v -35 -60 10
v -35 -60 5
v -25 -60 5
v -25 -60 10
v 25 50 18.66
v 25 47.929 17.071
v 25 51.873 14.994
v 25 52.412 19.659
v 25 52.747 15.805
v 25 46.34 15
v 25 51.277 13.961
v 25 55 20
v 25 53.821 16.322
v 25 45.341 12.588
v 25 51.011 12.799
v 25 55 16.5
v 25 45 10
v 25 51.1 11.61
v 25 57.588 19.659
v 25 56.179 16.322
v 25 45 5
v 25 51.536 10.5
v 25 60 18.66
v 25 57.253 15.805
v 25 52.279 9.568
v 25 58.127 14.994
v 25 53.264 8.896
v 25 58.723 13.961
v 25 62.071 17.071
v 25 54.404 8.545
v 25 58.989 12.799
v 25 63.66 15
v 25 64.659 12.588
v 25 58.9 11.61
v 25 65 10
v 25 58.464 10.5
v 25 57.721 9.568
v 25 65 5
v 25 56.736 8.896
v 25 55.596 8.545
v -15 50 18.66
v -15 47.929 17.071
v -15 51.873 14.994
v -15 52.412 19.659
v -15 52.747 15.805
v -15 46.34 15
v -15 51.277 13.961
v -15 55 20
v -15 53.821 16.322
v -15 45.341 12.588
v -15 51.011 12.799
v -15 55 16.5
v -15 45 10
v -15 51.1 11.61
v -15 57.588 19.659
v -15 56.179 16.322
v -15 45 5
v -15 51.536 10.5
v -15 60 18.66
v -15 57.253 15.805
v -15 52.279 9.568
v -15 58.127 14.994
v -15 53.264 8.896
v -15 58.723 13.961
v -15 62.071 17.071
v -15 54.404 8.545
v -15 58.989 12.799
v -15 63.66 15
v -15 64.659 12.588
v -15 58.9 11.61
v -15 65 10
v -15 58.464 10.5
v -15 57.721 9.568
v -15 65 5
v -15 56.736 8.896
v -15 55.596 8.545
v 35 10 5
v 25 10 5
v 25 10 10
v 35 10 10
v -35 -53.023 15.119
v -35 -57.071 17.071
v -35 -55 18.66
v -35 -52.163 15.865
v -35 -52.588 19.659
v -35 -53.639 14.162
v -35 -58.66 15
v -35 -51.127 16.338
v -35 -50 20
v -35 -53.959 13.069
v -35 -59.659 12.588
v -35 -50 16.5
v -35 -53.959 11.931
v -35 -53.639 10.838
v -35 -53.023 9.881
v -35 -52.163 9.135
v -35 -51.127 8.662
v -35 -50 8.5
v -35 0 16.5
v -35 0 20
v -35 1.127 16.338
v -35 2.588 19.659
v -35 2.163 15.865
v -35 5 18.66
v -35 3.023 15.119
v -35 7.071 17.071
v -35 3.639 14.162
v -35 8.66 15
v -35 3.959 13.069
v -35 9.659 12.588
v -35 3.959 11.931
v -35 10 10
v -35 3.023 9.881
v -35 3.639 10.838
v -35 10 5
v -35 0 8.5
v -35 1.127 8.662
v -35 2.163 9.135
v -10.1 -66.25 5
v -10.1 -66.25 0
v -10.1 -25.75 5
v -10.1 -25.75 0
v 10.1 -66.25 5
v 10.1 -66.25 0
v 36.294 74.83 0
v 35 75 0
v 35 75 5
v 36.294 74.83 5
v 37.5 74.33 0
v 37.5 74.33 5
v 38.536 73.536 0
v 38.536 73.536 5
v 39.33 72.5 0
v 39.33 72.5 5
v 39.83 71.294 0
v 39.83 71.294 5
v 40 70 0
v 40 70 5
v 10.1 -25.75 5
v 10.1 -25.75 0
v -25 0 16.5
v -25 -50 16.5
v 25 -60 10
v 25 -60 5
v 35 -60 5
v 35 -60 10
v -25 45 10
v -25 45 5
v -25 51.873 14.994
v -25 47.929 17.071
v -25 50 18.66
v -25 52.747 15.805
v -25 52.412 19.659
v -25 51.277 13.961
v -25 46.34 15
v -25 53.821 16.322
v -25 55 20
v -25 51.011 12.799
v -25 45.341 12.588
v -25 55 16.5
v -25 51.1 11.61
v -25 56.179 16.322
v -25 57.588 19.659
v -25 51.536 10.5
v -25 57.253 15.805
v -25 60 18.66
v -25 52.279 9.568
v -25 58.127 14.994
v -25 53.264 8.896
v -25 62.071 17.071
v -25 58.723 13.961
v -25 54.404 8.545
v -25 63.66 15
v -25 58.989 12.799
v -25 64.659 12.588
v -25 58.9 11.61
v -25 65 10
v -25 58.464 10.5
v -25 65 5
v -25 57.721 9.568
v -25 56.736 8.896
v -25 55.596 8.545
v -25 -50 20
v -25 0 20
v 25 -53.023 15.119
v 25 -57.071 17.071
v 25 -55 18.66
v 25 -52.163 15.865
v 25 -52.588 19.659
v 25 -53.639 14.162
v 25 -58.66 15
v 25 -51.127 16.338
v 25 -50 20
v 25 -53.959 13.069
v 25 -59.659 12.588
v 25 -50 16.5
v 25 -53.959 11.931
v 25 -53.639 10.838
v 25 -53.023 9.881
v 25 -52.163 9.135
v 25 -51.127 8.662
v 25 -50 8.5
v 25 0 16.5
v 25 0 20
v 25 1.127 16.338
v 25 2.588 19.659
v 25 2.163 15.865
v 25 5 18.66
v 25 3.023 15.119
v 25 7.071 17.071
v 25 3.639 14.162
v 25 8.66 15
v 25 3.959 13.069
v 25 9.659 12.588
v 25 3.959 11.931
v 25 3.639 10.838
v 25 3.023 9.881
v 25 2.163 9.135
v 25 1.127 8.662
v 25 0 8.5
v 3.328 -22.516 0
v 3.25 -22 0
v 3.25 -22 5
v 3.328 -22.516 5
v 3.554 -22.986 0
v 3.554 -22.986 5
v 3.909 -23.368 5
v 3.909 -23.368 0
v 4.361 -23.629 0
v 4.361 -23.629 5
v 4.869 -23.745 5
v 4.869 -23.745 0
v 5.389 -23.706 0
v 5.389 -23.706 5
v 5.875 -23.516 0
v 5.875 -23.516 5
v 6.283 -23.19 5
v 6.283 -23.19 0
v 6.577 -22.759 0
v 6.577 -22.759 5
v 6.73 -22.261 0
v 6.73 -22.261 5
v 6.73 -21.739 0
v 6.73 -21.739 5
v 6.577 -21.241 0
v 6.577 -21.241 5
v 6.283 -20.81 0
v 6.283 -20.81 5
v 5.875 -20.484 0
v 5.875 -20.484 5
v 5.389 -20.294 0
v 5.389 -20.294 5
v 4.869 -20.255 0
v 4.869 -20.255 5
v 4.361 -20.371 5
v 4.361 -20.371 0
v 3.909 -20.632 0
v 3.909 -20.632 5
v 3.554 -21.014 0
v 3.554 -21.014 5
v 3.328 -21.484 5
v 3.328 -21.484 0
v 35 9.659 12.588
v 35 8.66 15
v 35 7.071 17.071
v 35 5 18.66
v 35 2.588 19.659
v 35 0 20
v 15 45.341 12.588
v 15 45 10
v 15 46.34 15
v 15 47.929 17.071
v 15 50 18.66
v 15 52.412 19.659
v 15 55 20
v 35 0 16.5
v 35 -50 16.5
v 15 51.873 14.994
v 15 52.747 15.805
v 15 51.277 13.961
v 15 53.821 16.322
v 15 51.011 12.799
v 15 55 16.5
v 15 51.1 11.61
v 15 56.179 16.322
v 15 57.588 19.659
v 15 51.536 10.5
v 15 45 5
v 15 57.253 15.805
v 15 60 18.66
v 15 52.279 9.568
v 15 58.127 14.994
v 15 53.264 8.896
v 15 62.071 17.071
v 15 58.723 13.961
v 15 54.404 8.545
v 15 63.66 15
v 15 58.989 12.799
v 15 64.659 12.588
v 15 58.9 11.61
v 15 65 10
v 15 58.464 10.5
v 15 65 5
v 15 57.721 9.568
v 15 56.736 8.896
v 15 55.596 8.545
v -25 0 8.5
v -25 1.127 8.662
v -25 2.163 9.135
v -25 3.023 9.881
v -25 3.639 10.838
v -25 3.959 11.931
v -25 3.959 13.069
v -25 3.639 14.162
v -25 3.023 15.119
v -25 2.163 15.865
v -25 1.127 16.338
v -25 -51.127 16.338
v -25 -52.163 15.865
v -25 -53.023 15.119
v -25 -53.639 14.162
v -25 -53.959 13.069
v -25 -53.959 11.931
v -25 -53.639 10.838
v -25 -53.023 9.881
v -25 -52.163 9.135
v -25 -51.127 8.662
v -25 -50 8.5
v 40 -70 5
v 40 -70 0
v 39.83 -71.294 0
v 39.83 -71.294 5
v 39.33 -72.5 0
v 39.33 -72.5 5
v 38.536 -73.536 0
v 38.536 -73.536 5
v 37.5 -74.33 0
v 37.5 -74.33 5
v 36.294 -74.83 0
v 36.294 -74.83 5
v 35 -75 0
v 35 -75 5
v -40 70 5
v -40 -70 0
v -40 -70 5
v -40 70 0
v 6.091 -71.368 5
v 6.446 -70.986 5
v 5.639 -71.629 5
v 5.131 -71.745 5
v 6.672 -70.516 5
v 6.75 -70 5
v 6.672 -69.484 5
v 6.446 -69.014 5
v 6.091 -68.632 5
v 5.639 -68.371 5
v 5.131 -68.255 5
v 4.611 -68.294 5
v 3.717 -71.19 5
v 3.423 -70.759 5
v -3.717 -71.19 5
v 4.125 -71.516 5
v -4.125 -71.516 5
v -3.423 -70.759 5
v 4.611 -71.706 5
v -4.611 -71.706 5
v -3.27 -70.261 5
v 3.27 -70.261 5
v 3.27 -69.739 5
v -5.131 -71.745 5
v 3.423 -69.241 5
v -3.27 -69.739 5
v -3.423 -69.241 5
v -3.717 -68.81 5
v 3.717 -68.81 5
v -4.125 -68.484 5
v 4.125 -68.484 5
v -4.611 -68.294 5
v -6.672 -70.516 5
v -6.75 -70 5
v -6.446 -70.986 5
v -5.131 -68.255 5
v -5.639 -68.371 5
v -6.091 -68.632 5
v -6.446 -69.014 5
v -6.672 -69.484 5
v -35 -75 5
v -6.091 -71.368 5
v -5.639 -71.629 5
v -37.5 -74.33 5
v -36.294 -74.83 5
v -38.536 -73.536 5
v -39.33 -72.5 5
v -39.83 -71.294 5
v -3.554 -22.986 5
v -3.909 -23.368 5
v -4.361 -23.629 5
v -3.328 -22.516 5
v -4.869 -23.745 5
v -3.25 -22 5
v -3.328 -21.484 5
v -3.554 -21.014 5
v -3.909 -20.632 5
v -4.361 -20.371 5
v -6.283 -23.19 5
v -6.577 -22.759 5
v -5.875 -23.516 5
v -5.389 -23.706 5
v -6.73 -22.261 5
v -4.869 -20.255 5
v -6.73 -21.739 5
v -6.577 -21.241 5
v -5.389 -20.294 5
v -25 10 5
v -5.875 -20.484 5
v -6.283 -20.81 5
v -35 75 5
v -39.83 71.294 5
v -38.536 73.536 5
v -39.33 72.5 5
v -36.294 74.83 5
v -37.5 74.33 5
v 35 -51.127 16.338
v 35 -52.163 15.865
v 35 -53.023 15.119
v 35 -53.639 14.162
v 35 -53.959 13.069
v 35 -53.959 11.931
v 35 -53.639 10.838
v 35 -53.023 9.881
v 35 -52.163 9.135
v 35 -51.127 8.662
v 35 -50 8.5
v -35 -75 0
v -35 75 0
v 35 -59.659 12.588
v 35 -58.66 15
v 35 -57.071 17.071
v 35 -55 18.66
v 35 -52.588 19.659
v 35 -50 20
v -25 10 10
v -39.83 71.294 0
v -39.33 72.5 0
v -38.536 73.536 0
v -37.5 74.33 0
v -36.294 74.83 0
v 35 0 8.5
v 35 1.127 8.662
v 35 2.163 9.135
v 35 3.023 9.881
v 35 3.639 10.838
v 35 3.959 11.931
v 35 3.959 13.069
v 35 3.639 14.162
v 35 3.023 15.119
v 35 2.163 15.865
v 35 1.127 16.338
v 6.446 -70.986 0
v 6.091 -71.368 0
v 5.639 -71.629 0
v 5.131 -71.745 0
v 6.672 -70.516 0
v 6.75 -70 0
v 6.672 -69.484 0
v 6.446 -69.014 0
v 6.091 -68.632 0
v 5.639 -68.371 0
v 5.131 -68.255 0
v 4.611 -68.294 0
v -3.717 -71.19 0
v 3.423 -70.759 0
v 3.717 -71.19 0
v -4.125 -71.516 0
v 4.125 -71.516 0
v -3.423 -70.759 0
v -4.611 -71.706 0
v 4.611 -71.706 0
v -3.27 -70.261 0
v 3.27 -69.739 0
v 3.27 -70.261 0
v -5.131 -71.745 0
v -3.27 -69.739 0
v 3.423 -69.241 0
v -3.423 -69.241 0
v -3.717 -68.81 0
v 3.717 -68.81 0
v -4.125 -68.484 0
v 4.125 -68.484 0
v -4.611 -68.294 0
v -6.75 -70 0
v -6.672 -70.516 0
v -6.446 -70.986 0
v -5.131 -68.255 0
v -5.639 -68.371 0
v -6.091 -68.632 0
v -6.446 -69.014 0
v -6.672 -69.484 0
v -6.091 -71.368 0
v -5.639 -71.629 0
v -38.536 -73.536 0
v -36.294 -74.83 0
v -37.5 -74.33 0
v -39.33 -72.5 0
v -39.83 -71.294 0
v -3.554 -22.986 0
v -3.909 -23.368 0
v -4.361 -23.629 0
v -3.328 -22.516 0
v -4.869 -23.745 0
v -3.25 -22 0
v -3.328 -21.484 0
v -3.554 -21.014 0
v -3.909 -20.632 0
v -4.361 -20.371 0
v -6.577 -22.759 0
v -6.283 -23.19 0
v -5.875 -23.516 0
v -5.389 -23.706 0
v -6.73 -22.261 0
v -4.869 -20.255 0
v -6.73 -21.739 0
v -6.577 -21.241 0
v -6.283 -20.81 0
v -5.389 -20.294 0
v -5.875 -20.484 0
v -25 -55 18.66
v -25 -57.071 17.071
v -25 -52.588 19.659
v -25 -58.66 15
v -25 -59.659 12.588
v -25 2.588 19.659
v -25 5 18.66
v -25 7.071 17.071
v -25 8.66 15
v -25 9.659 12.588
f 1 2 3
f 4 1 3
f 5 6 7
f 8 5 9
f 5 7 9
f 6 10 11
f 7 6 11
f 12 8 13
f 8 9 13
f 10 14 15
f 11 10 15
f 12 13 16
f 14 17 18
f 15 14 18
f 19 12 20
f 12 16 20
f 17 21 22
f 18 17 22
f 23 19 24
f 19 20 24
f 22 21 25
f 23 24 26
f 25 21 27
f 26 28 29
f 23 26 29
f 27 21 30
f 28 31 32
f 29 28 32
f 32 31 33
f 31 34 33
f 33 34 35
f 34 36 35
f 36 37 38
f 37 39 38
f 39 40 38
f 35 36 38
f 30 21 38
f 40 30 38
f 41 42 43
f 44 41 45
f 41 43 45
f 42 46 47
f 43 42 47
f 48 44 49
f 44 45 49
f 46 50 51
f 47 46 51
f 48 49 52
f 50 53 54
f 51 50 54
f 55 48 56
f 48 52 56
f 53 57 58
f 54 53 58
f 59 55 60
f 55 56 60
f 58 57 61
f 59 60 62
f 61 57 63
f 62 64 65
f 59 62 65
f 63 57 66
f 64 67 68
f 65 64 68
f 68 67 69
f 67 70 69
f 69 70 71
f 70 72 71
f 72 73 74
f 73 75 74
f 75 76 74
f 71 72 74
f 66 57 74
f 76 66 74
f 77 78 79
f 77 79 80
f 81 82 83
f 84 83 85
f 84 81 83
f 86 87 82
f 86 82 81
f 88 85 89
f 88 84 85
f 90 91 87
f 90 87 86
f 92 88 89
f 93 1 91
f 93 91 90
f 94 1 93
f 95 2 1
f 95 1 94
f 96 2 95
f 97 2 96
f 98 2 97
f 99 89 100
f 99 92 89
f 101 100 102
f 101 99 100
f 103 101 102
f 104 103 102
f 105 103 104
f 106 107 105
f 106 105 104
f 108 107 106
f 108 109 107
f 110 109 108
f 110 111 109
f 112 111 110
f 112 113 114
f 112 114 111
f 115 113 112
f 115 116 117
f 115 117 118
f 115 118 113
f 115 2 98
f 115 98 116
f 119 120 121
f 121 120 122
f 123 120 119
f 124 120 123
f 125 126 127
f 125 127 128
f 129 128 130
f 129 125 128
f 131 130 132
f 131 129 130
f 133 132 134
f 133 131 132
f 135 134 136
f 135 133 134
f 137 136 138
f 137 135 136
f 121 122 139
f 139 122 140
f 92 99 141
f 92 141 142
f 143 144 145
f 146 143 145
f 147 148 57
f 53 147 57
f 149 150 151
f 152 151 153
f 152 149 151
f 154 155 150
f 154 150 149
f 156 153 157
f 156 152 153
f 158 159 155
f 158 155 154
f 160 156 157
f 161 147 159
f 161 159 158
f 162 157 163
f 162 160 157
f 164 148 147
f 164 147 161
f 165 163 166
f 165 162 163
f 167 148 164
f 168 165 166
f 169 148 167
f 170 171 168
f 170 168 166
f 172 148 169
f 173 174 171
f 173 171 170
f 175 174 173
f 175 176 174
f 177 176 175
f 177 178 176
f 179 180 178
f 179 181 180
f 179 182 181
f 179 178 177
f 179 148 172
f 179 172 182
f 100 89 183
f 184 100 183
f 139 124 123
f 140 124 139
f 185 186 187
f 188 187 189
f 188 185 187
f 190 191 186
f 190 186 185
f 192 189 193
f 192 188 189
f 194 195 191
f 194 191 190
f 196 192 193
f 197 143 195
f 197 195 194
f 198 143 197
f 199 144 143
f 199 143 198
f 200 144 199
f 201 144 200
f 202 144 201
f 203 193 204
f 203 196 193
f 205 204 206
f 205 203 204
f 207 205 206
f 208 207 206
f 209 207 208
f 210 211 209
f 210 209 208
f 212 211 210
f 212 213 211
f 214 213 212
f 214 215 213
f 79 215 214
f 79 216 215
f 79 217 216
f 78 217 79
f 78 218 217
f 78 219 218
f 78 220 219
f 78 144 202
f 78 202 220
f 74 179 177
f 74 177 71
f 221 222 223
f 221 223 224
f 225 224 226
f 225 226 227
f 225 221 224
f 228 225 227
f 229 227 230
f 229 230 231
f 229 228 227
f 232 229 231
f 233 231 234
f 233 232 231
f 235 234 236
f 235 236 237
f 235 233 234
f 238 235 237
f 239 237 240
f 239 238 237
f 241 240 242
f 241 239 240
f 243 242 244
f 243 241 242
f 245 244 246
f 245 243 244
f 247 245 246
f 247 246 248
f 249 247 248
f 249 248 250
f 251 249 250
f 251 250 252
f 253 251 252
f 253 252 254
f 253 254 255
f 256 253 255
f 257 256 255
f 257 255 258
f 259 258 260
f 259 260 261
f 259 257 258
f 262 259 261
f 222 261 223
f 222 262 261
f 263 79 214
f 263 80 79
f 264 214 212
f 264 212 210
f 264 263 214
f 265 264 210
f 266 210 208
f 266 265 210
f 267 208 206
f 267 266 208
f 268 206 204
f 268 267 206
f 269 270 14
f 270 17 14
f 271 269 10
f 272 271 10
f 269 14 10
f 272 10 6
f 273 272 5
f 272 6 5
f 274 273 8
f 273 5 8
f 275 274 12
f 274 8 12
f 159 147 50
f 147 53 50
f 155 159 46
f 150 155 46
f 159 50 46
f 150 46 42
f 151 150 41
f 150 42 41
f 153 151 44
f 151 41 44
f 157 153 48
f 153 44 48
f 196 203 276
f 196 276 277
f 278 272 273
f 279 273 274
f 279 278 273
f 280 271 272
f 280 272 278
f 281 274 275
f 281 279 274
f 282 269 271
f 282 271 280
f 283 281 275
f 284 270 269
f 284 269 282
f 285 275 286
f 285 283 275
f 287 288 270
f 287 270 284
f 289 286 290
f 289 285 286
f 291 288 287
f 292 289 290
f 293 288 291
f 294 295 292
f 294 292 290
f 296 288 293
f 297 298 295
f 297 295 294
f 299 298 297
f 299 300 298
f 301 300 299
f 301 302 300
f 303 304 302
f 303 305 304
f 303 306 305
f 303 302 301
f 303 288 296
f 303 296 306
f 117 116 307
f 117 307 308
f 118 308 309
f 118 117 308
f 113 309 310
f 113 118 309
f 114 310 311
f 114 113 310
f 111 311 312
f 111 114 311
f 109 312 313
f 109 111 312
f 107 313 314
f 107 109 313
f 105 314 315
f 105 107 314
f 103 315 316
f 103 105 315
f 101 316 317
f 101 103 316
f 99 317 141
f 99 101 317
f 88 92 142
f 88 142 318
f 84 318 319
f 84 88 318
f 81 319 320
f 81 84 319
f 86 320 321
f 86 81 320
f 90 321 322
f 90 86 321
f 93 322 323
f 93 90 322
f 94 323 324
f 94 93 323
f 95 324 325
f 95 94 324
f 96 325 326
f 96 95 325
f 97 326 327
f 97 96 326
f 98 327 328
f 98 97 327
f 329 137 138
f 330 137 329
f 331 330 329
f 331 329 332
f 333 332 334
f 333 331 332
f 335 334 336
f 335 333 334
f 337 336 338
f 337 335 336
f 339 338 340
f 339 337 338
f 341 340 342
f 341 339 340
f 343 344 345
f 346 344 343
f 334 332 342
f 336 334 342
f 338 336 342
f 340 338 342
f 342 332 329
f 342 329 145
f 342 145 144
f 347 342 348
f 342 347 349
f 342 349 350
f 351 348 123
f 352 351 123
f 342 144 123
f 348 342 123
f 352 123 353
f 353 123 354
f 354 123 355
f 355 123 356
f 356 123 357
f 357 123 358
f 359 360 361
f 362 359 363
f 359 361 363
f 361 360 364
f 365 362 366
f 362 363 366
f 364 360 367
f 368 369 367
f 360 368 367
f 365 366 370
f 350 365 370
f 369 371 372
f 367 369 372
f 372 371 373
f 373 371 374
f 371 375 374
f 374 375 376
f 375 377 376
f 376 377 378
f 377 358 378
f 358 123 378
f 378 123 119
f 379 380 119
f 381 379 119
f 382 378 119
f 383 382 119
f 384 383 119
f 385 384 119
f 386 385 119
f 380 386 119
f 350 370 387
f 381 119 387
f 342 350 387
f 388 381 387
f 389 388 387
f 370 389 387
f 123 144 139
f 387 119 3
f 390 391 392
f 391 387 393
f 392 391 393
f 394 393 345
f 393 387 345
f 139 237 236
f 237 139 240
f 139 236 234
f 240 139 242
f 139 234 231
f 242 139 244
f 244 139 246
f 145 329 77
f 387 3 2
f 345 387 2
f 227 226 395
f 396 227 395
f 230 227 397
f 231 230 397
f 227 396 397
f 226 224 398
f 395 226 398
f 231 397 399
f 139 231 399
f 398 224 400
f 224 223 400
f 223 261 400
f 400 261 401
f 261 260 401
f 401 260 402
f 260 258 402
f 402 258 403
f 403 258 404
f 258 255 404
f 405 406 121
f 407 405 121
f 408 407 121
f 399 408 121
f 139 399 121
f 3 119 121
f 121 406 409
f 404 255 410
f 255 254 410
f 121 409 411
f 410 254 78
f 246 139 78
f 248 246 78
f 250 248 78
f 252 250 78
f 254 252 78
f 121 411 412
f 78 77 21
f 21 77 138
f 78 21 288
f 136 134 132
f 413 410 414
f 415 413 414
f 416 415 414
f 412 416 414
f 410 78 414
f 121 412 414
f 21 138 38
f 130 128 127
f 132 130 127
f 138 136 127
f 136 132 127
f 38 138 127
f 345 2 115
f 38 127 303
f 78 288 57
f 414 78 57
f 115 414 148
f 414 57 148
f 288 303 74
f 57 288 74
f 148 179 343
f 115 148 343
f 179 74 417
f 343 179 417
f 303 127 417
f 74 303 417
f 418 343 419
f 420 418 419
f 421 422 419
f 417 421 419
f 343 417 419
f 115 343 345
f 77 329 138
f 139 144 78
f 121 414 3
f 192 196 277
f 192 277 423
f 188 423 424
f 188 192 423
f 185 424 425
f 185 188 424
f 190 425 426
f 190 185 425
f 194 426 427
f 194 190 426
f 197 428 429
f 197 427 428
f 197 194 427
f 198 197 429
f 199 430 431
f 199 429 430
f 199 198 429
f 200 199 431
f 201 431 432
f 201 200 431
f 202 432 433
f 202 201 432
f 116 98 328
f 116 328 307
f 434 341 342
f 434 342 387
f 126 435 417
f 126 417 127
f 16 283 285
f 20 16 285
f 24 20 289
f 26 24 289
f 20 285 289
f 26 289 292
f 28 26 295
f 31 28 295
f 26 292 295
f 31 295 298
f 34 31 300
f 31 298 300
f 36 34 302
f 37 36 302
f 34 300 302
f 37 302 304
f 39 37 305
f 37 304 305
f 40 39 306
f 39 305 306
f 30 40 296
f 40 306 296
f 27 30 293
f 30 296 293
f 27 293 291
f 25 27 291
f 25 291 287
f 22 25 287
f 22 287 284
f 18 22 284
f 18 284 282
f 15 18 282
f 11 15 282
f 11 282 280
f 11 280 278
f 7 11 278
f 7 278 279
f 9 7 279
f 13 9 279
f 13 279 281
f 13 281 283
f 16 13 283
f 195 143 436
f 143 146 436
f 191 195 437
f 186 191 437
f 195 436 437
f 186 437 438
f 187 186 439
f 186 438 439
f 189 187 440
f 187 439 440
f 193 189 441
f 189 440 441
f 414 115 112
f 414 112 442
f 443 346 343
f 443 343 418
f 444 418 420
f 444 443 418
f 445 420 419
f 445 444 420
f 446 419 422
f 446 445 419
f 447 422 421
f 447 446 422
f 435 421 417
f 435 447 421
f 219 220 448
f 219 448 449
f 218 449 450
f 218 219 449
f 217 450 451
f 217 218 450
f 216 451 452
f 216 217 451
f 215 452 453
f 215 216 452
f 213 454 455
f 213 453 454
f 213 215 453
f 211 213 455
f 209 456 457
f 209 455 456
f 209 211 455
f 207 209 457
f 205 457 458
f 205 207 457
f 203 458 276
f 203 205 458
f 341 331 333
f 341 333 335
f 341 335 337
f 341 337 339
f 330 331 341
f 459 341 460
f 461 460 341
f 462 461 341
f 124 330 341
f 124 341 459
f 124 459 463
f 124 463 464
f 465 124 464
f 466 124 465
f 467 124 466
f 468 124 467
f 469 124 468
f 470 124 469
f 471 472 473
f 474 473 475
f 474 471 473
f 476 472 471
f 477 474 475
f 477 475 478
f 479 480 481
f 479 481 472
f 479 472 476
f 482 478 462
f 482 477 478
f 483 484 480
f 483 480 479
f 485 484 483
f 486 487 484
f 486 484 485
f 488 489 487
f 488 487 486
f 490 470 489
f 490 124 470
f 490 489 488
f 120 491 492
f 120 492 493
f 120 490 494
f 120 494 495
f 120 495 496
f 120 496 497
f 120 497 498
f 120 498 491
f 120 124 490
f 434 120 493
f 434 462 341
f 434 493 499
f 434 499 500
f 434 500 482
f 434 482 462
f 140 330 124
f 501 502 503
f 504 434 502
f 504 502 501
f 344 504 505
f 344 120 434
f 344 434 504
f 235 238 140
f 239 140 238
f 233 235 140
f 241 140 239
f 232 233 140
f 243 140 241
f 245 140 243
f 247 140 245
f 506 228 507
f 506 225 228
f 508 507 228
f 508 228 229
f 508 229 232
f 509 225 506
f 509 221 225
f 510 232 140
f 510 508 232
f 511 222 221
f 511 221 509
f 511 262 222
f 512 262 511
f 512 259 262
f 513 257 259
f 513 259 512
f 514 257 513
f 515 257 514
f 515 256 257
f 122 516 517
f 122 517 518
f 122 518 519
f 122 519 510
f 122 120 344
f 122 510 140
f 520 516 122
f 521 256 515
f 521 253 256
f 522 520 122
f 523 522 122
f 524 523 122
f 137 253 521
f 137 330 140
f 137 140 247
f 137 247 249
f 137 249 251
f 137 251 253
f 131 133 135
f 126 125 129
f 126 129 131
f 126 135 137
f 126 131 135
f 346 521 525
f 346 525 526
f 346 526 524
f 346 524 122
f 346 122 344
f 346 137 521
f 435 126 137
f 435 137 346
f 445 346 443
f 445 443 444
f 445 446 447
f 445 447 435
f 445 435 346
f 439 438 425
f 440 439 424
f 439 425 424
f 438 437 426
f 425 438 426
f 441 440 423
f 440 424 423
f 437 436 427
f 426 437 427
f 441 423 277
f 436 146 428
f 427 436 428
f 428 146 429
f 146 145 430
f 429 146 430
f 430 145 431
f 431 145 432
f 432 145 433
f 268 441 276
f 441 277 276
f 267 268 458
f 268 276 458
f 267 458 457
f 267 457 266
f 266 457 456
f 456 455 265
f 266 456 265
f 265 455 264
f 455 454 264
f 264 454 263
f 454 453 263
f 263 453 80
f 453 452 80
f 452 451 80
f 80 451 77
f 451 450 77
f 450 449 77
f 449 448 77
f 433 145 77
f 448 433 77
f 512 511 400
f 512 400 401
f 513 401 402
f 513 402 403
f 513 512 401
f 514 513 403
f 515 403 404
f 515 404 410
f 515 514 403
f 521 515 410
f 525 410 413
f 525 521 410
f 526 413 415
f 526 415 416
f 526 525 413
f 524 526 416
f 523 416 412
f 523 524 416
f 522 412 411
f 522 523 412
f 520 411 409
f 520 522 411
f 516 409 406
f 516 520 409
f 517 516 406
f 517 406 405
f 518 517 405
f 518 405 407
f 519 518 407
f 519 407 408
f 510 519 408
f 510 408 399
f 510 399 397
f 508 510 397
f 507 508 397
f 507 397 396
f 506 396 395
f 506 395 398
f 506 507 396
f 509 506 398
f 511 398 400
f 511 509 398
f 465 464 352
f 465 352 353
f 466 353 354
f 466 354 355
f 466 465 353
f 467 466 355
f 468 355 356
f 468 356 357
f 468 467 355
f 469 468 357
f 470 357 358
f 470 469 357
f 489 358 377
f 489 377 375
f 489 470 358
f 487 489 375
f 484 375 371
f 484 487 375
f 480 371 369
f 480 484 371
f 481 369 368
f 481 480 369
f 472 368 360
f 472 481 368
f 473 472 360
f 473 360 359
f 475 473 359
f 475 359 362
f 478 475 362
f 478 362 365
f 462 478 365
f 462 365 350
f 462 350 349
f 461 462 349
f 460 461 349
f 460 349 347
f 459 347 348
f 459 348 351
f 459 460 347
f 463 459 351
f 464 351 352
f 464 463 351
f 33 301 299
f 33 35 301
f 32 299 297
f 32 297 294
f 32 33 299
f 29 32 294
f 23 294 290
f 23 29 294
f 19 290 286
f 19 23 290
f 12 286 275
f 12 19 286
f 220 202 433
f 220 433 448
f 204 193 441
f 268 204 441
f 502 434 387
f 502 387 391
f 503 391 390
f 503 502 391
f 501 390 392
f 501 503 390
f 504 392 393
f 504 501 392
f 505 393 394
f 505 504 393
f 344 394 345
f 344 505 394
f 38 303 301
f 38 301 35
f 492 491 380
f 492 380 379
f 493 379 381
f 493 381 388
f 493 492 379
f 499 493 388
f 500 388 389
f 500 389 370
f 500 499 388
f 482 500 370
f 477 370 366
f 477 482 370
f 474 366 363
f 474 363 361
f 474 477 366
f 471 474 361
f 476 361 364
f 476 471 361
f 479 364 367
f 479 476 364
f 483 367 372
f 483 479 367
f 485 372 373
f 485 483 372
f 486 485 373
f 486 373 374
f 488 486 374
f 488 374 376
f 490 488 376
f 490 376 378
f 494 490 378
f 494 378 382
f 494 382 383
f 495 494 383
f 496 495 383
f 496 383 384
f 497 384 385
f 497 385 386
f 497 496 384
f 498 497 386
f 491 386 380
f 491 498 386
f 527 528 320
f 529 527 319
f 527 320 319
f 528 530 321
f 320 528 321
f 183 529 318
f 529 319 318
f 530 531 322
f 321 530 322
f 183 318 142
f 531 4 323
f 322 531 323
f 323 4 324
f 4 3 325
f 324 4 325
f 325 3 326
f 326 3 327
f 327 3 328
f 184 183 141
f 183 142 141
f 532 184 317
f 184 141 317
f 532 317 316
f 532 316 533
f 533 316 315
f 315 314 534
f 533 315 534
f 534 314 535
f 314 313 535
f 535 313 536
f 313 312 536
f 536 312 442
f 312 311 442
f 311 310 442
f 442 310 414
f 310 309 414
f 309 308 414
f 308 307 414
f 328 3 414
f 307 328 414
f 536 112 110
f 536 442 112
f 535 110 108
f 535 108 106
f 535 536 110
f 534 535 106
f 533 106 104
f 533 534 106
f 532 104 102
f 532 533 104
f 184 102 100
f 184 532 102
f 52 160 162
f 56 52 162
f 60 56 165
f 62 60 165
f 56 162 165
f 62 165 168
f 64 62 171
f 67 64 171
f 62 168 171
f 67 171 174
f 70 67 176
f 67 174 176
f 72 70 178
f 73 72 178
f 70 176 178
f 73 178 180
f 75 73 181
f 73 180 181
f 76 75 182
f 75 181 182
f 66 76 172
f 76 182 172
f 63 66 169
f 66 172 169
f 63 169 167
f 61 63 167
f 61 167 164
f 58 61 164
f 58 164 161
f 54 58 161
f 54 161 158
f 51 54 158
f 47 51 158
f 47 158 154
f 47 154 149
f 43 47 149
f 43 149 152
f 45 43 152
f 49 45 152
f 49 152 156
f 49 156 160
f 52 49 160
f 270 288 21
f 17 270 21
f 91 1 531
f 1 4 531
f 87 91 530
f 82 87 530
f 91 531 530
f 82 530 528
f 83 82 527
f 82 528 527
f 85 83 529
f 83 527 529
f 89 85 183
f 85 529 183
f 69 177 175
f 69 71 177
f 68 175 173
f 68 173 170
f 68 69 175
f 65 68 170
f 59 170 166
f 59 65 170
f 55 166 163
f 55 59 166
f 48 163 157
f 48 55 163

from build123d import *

# Parameters (mm, degrees)
SKETCH_1_R          = 1.75
SKETCH_1_W          = 20.2
SKETCH_1_H          = 40.5
EXTRUDE_1_DEPTH     = 5
SKETCH_2_W          = 10
SKETCH_2_H          = 20
SKETCH_2_H_2        = 70
EXTRUDE_2_DEPTH     = 15
SKETCH_3_R          = 4
CUT_EXTRUDE_1_DEPTH = 146
FILLET_1_R          = 10


with BuildPart() as part:
    # 草图1 → 凸台-拉伸1 (new body)
    with BuildSketch(Plane.XY):
        with BuildLine():
            Line((35, -75), (-35, -75))
            ThreePointArc((-35, -75), (-38.535533906, -73.535533906), (-40, -70))
            Line((-40, -70), (-40, 70))
            ThreePointArc((-40, 70), (-38.535533906, 73.535533906), (-35, 75))
            Line((-35, 75), (35, 75))
            ThreePointArc((35, 75), (38.535533906, 73.535533906), (40, 70))
            Line((40, 70), (40, -70))
            ThreePointArc((40, -70), (38.535533906, -73.535533906), (35, -75))
        make_face()
        with Locations((-5, -22)):
            Circle(SKETCH_1_R, mode=Mode.SUBTRACT)
        with Locations(Location((5, -22, 0), (0, 0, 180))):
            Circle(SKETCH_1_R, mode=Mode.SUBTRACT)
        with Locations((5, -70)):
            Circle(SKETCH_1_R, mode=Mode.SUBTRACT)
        with Locations(Location((-5, -70, 0), (0, 0, 180))):
            Circle(SKETCH_1_R, mode=Mode.SUBTRACT)
        with Locations((0, -46)):
            Rectangle(SKETCH_1_W, SKETCH_1_H, mode=Mode.SUBTRACT)
    extrude(amount=EXTRUDE_1_DEPTH)

    # 草图2 → 凸台-拉伸2 (add)
    with BuildSketch(Plane.XY.offset(5)):
        with Locations((20, 55)):
            Rectangle(SKETCH_2_W, SKETCH_2_H)
        with Locations((30, -25)):
            Rectangle(SKETCH_2_W, SKETCH_2_H_2)
        with Locations((-30, -25)):
            Rectangle(SKETCH_2_W, SKETCH_2_H_2)
        with Locations((-20, 55)):
            Rectangle(SKETCH_2_W, SKETCH_2_H)
    extrude(amount=EXTRUDE_2_DEPTH)

    # 草图3 → 切除-拉伸1 (cut)
    with BuildSketch(Plane.ZY.offset(35)):
        with Locations((12.5, 55)):
            Circle(SKETCH_3_R)
        with BuildLine():
            Line((8.5, -50), (8.5, 0))
            ThreePointArc((8.5, 0), (12.5, 4), (16.5, 0))
            Line((16.5, 0), (16.5, -50))
            ThreePointArc((16.5, -50), (12.5, -54), (8.5, -50))
        make_face()
    extrude(amount=-CUT_EXTRUDE_1_DEPTH, mode=Mode.SUBTRACT)

    # 圆角1
    fillet_1_edges = [part.edges().sort_by_distance(p)[0] for p in [
        (30, -60, 20),
        (-30, -60, 20),
        (30, 10, 20),
        (-30, 10, 20),
        (20, 45, 20),
        (20, 65, 20),
        (-20, 45, 20),
        (-20, 65, 20),
    ]]
    fillet(fillet_1_edges, radius=FILLET_1_R - 0.0001)  # a hair under: the kernel refuses the full size


solid = part.part
